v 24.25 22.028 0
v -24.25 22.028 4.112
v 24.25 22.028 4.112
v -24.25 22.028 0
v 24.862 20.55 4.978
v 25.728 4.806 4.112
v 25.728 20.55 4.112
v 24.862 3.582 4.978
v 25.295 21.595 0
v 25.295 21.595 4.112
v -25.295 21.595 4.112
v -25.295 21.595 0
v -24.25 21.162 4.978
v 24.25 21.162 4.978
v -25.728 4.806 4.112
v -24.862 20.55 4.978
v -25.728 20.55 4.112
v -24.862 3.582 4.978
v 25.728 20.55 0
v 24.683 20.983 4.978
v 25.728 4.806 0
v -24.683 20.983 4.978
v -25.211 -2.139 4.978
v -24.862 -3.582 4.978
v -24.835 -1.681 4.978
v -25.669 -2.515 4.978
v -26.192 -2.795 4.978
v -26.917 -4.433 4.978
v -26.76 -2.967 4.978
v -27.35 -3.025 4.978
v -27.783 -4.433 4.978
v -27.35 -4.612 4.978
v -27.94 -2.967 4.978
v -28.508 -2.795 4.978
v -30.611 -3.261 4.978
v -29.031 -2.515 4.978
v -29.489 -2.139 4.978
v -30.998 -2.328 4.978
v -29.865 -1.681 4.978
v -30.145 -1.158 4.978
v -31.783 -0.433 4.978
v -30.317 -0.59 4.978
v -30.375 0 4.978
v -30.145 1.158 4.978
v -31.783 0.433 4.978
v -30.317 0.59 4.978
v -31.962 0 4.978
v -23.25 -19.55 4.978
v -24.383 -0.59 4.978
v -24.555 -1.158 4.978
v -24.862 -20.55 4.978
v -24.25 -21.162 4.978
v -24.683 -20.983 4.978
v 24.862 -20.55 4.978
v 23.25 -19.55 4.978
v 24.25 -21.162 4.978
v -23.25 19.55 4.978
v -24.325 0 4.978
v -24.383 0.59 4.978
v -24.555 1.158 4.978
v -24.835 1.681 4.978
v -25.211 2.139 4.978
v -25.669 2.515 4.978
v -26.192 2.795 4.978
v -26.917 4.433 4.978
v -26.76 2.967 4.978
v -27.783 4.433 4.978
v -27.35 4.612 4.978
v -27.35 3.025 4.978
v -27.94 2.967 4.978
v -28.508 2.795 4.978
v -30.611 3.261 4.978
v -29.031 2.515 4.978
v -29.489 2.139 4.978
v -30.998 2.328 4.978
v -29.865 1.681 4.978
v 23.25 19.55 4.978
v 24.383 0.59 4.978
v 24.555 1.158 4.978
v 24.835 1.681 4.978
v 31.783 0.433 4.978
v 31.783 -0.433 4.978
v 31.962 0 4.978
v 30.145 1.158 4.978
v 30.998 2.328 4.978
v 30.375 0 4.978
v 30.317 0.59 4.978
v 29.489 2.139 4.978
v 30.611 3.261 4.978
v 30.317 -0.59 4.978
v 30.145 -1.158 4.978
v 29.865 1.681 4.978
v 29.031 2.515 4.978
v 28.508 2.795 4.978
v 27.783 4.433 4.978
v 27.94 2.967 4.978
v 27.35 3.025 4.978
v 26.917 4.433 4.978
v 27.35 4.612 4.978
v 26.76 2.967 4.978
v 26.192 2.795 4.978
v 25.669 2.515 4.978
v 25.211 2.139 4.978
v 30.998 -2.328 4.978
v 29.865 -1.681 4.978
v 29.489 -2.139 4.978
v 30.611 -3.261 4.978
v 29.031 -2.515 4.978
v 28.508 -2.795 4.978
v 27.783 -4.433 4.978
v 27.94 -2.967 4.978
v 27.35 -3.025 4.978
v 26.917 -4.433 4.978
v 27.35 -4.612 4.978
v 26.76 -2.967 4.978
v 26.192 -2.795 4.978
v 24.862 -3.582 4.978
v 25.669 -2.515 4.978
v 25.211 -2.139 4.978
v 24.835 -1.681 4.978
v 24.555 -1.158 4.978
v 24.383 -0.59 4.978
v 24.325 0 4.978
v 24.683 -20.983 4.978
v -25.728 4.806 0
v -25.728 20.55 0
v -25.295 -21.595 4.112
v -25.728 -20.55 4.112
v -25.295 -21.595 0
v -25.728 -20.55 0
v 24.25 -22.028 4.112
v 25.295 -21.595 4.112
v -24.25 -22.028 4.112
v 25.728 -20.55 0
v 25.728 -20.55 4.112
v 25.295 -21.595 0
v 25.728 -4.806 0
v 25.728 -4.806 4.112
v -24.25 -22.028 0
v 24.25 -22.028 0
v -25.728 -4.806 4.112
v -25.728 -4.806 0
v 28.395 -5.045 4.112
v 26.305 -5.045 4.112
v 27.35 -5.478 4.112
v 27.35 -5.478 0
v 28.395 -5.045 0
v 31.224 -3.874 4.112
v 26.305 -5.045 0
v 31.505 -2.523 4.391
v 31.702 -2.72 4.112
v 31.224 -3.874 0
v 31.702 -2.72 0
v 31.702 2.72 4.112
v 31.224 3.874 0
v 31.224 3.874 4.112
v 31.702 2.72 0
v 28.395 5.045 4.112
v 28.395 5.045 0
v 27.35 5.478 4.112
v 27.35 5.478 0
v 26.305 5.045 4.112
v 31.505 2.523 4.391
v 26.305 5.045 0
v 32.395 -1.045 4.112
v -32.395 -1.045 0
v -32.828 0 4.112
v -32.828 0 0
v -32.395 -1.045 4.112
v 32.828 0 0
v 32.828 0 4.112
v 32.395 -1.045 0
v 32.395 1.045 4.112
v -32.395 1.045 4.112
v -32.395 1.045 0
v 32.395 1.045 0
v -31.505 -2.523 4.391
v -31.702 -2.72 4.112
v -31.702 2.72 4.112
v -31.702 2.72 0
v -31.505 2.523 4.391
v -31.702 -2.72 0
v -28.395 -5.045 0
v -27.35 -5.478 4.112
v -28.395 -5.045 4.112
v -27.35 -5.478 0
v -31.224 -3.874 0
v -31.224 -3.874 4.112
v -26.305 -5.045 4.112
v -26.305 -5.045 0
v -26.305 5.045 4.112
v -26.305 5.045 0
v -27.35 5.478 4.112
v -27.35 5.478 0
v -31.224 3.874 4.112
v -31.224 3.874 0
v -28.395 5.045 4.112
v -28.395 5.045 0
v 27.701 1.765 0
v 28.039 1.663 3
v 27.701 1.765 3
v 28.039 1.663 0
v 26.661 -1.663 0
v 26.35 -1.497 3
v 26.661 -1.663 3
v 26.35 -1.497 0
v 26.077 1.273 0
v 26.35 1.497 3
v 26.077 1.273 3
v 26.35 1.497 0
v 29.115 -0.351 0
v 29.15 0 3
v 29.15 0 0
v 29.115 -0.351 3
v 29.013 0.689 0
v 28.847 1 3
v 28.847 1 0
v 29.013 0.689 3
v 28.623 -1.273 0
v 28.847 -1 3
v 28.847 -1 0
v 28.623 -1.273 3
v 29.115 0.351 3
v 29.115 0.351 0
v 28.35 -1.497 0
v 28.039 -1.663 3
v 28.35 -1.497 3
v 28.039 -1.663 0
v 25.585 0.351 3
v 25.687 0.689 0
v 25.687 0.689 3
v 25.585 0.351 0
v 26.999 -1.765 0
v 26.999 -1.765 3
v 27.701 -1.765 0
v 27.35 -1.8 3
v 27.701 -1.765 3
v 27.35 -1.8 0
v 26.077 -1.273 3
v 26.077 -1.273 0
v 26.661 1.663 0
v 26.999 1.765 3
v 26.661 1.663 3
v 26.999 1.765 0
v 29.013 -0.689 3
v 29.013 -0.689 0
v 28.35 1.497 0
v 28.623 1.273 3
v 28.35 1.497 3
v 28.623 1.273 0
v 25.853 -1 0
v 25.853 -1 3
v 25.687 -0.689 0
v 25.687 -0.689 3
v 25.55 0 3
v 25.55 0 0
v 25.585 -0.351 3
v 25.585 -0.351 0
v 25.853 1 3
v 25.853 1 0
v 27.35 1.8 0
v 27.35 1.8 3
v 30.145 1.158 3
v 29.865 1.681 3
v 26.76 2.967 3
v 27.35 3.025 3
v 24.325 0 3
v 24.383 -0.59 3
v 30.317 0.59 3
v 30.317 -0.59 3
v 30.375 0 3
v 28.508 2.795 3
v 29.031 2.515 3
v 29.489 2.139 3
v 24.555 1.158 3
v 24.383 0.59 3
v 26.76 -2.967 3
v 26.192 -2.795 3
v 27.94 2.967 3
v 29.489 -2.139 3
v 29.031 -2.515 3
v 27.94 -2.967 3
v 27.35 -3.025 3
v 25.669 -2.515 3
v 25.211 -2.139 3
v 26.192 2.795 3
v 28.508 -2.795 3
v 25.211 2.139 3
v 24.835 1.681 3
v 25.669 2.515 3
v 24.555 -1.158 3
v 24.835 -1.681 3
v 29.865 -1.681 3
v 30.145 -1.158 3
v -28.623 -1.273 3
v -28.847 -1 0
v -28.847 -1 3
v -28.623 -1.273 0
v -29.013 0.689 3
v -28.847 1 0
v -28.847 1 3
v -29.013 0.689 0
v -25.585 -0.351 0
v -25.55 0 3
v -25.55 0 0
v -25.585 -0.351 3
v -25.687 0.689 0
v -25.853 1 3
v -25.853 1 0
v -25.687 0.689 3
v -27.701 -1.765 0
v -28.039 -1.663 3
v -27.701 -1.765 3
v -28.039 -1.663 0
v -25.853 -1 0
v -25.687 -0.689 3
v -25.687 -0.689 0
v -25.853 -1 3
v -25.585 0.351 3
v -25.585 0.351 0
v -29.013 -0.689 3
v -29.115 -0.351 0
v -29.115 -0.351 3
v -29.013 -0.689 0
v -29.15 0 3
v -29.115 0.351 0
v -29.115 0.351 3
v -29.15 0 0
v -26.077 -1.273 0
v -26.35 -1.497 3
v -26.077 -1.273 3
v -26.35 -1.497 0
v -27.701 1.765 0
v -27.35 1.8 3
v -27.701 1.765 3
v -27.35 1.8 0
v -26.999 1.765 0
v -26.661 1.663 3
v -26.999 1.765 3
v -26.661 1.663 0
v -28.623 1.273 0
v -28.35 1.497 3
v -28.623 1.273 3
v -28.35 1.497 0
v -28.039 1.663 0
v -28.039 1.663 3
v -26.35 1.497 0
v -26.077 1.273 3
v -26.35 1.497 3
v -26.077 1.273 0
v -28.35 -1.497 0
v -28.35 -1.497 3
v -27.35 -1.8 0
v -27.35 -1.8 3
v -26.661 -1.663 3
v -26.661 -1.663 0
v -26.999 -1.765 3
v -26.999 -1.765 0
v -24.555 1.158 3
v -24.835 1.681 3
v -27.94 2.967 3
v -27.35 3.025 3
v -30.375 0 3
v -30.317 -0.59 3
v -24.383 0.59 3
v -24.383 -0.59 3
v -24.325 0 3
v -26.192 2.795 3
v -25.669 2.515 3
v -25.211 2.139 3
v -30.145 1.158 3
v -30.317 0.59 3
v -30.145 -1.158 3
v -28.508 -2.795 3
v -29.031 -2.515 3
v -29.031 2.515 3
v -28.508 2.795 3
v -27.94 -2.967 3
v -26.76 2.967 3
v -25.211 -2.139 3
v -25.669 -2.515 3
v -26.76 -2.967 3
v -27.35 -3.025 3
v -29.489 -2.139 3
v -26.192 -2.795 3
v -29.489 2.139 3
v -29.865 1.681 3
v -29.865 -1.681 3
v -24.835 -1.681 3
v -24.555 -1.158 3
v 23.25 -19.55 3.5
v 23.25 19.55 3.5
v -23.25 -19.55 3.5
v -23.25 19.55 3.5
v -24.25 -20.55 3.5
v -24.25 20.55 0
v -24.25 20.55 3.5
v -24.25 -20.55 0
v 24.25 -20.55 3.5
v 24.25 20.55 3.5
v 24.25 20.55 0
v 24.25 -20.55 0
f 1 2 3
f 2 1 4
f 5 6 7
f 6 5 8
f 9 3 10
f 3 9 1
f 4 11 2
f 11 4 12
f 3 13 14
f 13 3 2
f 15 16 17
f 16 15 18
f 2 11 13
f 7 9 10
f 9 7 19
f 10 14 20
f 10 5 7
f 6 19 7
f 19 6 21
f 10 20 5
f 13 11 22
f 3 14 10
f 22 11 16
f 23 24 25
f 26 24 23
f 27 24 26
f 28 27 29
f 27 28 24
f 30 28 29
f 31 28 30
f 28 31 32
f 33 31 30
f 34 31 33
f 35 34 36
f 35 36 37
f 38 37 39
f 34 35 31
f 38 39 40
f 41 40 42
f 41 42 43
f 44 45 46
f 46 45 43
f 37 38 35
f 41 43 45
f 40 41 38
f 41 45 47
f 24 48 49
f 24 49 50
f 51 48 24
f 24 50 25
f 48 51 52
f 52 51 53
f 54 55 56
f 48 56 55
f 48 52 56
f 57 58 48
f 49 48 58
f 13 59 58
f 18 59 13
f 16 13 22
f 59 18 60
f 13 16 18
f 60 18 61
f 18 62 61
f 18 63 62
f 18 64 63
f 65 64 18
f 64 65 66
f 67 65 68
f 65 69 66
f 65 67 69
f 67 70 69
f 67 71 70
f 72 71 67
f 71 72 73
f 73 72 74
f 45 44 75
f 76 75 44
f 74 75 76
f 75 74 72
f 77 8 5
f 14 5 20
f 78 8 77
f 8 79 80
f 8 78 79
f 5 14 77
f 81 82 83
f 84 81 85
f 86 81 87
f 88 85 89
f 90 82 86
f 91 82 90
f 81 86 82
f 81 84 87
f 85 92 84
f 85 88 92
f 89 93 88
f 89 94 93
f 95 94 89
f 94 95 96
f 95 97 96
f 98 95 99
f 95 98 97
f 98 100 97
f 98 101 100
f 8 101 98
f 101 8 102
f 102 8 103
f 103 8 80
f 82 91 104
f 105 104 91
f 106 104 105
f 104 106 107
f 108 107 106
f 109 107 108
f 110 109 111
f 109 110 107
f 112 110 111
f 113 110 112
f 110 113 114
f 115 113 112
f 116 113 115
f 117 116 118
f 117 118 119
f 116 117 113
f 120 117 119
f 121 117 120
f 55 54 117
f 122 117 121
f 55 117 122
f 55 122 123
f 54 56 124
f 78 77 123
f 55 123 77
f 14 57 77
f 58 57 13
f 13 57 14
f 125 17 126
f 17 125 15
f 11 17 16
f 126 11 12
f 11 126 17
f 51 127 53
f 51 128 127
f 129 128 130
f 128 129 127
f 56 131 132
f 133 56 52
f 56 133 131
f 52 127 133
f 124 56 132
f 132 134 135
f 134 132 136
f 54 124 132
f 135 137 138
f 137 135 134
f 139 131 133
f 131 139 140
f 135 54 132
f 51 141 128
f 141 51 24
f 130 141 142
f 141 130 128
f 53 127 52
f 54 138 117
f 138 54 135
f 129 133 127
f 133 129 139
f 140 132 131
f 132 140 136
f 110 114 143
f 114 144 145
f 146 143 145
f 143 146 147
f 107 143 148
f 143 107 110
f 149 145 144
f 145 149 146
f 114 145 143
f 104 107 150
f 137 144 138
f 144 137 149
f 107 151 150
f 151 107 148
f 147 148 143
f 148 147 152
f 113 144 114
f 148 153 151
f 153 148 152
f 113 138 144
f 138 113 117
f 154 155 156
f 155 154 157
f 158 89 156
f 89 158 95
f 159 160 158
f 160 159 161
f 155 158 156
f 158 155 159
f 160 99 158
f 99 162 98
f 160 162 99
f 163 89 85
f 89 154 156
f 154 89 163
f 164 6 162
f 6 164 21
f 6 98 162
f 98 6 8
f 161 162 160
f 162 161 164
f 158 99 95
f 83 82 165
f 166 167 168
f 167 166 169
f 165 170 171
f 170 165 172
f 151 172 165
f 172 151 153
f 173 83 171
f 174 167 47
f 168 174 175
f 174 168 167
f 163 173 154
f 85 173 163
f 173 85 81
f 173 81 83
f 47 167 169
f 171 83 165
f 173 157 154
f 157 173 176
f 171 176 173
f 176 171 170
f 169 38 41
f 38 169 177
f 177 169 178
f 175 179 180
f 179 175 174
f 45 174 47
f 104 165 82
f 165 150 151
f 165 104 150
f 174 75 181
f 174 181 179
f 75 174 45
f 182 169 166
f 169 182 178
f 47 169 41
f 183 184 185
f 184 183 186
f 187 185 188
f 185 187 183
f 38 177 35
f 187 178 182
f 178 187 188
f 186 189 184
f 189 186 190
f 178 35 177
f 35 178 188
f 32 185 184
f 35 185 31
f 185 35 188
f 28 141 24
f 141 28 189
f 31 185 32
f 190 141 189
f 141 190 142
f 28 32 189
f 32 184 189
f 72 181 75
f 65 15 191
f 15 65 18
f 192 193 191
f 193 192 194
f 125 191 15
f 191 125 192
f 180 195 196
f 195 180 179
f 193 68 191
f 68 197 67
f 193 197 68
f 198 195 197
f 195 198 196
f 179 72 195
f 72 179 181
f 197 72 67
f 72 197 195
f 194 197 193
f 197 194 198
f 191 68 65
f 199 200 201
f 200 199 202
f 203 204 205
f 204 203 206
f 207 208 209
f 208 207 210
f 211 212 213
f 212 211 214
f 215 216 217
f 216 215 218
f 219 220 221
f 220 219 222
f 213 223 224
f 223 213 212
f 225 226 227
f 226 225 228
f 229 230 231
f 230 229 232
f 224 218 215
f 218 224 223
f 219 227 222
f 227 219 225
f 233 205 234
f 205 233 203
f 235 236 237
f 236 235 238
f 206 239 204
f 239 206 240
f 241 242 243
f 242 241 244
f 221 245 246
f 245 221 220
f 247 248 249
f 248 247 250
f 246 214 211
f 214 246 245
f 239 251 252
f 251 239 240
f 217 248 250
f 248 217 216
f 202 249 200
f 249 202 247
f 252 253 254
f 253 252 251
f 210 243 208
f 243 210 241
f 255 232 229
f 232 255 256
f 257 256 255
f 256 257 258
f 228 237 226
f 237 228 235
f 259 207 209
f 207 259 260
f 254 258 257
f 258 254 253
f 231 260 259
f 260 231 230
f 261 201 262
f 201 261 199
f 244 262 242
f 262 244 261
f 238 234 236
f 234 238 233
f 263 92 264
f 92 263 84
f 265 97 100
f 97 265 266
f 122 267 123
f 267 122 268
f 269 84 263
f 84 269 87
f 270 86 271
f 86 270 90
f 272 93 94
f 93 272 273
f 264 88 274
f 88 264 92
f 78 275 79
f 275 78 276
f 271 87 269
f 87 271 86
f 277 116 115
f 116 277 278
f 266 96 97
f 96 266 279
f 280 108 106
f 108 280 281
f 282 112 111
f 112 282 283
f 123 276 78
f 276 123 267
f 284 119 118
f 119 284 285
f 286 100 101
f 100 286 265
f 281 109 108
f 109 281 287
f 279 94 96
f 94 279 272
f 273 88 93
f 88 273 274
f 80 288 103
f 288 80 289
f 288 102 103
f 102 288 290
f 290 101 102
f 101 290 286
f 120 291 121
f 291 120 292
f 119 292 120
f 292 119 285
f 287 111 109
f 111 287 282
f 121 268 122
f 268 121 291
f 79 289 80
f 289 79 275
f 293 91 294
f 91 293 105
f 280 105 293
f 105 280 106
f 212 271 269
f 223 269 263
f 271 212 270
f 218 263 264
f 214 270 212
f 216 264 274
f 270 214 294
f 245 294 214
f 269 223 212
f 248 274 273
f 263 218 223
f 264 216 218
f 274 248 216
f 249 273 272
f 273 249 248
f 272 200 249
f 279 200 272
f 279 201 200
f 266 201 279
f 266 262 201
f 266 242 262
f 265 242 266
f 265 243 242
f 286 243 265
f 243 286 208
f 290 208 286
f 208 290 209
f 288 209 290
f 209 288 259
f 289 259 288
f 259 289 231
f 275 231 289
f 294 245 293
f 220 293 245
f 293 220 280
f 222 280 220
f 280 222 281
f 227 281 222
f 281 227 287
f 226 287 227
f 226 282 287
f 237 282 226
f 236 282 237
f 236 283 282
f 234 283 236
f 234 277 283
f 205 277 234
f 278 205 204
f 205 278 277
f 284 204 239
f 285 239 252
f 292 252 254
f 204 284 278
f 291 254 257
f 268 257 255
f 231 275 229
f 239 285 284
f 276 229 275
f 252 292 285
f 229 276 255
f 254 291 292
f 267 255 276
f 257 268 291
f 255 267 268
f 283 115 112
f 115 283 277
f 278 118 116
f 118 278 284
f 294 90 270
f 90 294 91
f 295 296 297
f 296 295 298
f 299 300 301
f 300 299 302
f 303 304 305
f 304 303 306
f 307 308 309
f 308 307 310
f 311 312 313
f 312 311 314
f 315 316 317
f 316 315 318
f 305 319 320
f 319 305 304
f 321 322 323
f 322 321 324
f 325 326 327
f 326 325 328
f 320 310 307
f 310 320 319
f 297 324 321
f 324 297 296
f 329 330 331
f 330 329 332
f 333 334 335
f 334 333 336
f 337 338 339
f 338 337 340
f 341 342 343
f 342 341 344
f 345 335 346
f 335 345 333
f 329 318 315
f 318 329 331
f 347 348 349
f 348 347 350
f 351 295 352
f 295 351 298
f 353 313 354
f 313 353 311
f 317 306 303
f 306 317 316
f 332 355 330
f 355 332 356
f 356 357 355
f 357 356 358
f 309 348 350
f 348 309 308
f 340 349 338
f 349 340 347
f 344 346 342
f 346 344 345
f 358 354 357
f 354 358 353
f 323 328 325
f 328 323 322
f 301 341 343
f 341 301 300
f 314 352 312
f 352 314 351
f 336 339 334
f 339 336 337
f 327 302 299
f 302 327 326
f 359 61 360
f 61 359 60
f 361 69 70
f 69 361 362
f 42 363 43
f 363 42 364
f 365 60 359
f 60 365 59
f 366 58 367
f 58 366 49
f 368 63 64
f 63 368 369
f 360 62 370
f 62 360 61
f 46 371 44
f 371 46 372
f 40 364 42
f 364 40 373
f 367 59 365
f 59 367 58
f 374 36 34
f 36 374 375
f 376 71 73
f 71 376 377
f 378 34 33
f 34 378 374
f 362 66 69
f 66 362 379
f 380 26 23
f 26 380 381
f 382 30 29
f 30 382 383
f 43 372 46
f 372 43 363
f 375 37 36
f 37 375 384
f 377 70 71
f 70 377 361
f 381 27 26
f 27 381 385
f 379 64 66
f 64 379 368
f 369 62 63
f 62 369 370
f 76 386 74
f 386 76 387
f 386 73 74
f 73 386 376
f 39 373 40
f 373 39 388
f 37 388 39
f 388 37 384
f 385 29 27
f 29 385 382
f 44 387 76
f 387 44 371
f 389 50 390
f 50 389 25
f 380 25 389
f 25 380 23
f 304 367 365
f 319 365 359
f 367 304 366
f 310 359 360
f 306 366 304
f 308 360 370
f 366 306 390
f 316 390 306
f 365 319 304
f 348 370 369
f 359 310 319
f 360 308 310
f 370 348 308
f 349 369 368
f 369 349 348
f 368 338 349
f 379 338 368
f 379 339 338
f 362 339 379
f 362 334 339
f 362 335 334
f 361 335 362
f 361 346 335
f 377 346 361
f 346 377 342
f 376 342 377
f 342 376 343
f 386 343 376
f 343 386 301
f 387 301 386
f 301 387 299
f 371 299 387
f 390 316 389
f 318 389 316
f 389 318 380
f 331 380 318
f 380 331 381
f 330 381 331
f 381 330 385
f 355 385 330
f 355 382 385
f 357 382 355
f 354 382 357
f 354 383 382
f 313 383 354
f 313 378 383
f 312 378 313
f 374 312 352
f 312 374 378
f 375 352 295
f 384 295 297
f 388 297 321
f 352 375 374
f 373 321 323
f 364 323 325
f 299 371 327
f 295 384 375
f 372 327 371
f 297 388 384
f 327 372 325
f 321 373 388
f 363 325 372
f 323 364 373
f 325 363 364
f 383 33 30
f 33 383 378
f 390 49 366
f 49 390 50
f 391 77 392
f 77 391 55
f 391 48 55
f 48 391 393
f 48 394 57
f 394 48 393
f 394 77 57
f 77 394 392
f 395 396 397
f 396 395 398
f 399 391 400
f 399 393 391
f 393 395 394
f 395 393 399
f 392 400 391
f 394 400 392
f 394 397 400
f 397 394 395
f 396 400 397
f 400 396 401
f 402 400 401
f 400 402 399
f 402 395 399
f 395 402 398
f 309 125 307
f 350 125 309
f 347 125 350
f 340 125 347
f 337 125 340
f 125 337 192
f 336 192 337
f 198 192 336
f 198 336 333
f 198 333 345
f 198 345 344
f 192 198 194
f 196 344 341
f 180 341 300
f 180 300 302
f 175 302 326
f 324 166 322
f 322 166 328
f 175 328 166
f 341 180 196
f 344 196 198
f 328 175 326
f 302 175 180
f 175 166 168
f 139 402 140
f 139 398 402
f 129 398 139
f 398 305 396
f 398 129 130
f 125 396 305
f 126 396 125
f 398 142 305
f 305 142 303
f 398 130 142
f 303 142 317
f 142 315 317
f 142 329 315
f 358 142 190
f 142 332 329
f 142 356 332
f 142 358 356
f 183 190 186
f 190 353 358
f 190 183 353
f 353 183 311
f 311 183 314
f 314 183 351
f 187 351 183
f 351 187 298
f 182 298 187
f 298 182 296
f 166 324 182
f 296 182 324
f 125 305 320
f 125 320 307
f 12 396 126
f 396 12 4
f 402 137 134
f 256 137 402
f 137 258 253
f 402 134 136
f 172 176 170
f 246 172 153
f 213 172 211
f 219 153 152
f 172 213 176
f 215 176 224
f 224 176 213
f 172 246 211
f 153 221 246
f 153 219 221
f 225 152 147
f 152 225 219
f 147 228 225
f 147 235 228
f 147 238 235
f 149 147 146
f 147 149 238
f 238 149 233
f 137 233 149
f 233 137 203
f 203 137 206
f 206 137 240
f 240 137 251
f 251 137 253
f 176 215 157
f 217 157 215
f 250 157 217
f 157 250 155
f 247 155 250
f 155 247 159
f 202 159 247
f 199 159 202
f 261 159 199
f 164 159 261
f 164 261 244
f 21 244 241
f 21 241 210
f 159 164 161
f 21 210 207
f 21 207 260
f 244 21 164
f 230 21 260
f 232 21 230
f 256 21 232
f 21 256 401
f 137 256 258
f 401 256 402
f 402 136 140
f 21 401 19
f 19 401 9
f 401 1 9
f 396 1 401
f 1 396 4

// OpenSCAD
// file: syms.scad
module symY(t) {
    translate(t)
        children();
    mirror([0,1,0])
        translate(t)
            children();
}
module symX(t) {
    translate(t)
        children();
    mirror([1,0,0])
        translate(t)
            children();
}

module symZ(t) {
    translate(t)
        children();
    mirror([0,0,1])
        translate(t)
            children();
}

module	symXY(t) {
	tx=t[0];
	ty=t[1];
	tz=t[2];
	symX([tx,0,0])
	symY([0,ty,tz])
		children();
}

module magnetCut(D,S) {
    cylinder(d=D,h=10);
    for(d=[45,-45])
    rotate(d)
    cube([2*D,S,30],center=true);
}


// calculates the radius from "segment" paramers:
// https://en.wikipedia.org/wiki/Circular_segment
function    circleSlice2radius2(c,h) = (c*c/8/h)+ h/2;

function toInt(str) = 
    let(d = [for (s = str) ord(s) - 48], l = len(d) - 1)
    [for (i = 0, a = d[i];i <= l;i = i + 1, a = 10 * a + d[i]) a][l];
        
// main file
use <syms.scad>
W=1.6;

$fn=32;

A=48.5;
B=40.8+.3;
C=3.5;//1.8;


K=8;
Q=1;


module profile() {
    

difference() {
    

    offset(W)
    square([A,W+C+Q/2]);

    translate([Q,0])
    square([A-2*Q,A]);

    hull() {
    translate([0,W])
    square([A,C]);
    translate([Q,W+C+Q])
    square([A-2*Q,.1]);
    }
    
}

}

mode="simple";
if(mode=="fancy") {
linear_extrude(B)
profile();
}


Z=1.5+W;

hole_pos=[ [A/2+Z,0],-[A/2+Z,0] ];



if(mode=="simple") {

        difference() {
            minkowski() {
                union() {
                    linear_extrude(height=C)
    //                offset(W)       
                    square([A,B],center=true);
                    
                    for(p=hole_pos) {
                        translate(p)
                        cylinder($fn=8,d=K,h=C);
                    }
                }
              sphere(W,$fn=8);
                
            }
            linear_extrude(height=100,center=true)
            offset(-Q)
            square([A,B],center=true);

            linear_extrude(height=2*C,center=true)
            square([A,B],center=true);


            for(p=hole_pos) {
                translate(p) {
                    cylinder(d=3.6,h=100,center=true);
                    translate([0,0,C+W-2.1])
                    cylinder(d=6.05,h=100);
                }
            }

            
            translate([-100,-100,-200])
            cube(200);
//                square([A,B]);
            
            
            
        }
}
